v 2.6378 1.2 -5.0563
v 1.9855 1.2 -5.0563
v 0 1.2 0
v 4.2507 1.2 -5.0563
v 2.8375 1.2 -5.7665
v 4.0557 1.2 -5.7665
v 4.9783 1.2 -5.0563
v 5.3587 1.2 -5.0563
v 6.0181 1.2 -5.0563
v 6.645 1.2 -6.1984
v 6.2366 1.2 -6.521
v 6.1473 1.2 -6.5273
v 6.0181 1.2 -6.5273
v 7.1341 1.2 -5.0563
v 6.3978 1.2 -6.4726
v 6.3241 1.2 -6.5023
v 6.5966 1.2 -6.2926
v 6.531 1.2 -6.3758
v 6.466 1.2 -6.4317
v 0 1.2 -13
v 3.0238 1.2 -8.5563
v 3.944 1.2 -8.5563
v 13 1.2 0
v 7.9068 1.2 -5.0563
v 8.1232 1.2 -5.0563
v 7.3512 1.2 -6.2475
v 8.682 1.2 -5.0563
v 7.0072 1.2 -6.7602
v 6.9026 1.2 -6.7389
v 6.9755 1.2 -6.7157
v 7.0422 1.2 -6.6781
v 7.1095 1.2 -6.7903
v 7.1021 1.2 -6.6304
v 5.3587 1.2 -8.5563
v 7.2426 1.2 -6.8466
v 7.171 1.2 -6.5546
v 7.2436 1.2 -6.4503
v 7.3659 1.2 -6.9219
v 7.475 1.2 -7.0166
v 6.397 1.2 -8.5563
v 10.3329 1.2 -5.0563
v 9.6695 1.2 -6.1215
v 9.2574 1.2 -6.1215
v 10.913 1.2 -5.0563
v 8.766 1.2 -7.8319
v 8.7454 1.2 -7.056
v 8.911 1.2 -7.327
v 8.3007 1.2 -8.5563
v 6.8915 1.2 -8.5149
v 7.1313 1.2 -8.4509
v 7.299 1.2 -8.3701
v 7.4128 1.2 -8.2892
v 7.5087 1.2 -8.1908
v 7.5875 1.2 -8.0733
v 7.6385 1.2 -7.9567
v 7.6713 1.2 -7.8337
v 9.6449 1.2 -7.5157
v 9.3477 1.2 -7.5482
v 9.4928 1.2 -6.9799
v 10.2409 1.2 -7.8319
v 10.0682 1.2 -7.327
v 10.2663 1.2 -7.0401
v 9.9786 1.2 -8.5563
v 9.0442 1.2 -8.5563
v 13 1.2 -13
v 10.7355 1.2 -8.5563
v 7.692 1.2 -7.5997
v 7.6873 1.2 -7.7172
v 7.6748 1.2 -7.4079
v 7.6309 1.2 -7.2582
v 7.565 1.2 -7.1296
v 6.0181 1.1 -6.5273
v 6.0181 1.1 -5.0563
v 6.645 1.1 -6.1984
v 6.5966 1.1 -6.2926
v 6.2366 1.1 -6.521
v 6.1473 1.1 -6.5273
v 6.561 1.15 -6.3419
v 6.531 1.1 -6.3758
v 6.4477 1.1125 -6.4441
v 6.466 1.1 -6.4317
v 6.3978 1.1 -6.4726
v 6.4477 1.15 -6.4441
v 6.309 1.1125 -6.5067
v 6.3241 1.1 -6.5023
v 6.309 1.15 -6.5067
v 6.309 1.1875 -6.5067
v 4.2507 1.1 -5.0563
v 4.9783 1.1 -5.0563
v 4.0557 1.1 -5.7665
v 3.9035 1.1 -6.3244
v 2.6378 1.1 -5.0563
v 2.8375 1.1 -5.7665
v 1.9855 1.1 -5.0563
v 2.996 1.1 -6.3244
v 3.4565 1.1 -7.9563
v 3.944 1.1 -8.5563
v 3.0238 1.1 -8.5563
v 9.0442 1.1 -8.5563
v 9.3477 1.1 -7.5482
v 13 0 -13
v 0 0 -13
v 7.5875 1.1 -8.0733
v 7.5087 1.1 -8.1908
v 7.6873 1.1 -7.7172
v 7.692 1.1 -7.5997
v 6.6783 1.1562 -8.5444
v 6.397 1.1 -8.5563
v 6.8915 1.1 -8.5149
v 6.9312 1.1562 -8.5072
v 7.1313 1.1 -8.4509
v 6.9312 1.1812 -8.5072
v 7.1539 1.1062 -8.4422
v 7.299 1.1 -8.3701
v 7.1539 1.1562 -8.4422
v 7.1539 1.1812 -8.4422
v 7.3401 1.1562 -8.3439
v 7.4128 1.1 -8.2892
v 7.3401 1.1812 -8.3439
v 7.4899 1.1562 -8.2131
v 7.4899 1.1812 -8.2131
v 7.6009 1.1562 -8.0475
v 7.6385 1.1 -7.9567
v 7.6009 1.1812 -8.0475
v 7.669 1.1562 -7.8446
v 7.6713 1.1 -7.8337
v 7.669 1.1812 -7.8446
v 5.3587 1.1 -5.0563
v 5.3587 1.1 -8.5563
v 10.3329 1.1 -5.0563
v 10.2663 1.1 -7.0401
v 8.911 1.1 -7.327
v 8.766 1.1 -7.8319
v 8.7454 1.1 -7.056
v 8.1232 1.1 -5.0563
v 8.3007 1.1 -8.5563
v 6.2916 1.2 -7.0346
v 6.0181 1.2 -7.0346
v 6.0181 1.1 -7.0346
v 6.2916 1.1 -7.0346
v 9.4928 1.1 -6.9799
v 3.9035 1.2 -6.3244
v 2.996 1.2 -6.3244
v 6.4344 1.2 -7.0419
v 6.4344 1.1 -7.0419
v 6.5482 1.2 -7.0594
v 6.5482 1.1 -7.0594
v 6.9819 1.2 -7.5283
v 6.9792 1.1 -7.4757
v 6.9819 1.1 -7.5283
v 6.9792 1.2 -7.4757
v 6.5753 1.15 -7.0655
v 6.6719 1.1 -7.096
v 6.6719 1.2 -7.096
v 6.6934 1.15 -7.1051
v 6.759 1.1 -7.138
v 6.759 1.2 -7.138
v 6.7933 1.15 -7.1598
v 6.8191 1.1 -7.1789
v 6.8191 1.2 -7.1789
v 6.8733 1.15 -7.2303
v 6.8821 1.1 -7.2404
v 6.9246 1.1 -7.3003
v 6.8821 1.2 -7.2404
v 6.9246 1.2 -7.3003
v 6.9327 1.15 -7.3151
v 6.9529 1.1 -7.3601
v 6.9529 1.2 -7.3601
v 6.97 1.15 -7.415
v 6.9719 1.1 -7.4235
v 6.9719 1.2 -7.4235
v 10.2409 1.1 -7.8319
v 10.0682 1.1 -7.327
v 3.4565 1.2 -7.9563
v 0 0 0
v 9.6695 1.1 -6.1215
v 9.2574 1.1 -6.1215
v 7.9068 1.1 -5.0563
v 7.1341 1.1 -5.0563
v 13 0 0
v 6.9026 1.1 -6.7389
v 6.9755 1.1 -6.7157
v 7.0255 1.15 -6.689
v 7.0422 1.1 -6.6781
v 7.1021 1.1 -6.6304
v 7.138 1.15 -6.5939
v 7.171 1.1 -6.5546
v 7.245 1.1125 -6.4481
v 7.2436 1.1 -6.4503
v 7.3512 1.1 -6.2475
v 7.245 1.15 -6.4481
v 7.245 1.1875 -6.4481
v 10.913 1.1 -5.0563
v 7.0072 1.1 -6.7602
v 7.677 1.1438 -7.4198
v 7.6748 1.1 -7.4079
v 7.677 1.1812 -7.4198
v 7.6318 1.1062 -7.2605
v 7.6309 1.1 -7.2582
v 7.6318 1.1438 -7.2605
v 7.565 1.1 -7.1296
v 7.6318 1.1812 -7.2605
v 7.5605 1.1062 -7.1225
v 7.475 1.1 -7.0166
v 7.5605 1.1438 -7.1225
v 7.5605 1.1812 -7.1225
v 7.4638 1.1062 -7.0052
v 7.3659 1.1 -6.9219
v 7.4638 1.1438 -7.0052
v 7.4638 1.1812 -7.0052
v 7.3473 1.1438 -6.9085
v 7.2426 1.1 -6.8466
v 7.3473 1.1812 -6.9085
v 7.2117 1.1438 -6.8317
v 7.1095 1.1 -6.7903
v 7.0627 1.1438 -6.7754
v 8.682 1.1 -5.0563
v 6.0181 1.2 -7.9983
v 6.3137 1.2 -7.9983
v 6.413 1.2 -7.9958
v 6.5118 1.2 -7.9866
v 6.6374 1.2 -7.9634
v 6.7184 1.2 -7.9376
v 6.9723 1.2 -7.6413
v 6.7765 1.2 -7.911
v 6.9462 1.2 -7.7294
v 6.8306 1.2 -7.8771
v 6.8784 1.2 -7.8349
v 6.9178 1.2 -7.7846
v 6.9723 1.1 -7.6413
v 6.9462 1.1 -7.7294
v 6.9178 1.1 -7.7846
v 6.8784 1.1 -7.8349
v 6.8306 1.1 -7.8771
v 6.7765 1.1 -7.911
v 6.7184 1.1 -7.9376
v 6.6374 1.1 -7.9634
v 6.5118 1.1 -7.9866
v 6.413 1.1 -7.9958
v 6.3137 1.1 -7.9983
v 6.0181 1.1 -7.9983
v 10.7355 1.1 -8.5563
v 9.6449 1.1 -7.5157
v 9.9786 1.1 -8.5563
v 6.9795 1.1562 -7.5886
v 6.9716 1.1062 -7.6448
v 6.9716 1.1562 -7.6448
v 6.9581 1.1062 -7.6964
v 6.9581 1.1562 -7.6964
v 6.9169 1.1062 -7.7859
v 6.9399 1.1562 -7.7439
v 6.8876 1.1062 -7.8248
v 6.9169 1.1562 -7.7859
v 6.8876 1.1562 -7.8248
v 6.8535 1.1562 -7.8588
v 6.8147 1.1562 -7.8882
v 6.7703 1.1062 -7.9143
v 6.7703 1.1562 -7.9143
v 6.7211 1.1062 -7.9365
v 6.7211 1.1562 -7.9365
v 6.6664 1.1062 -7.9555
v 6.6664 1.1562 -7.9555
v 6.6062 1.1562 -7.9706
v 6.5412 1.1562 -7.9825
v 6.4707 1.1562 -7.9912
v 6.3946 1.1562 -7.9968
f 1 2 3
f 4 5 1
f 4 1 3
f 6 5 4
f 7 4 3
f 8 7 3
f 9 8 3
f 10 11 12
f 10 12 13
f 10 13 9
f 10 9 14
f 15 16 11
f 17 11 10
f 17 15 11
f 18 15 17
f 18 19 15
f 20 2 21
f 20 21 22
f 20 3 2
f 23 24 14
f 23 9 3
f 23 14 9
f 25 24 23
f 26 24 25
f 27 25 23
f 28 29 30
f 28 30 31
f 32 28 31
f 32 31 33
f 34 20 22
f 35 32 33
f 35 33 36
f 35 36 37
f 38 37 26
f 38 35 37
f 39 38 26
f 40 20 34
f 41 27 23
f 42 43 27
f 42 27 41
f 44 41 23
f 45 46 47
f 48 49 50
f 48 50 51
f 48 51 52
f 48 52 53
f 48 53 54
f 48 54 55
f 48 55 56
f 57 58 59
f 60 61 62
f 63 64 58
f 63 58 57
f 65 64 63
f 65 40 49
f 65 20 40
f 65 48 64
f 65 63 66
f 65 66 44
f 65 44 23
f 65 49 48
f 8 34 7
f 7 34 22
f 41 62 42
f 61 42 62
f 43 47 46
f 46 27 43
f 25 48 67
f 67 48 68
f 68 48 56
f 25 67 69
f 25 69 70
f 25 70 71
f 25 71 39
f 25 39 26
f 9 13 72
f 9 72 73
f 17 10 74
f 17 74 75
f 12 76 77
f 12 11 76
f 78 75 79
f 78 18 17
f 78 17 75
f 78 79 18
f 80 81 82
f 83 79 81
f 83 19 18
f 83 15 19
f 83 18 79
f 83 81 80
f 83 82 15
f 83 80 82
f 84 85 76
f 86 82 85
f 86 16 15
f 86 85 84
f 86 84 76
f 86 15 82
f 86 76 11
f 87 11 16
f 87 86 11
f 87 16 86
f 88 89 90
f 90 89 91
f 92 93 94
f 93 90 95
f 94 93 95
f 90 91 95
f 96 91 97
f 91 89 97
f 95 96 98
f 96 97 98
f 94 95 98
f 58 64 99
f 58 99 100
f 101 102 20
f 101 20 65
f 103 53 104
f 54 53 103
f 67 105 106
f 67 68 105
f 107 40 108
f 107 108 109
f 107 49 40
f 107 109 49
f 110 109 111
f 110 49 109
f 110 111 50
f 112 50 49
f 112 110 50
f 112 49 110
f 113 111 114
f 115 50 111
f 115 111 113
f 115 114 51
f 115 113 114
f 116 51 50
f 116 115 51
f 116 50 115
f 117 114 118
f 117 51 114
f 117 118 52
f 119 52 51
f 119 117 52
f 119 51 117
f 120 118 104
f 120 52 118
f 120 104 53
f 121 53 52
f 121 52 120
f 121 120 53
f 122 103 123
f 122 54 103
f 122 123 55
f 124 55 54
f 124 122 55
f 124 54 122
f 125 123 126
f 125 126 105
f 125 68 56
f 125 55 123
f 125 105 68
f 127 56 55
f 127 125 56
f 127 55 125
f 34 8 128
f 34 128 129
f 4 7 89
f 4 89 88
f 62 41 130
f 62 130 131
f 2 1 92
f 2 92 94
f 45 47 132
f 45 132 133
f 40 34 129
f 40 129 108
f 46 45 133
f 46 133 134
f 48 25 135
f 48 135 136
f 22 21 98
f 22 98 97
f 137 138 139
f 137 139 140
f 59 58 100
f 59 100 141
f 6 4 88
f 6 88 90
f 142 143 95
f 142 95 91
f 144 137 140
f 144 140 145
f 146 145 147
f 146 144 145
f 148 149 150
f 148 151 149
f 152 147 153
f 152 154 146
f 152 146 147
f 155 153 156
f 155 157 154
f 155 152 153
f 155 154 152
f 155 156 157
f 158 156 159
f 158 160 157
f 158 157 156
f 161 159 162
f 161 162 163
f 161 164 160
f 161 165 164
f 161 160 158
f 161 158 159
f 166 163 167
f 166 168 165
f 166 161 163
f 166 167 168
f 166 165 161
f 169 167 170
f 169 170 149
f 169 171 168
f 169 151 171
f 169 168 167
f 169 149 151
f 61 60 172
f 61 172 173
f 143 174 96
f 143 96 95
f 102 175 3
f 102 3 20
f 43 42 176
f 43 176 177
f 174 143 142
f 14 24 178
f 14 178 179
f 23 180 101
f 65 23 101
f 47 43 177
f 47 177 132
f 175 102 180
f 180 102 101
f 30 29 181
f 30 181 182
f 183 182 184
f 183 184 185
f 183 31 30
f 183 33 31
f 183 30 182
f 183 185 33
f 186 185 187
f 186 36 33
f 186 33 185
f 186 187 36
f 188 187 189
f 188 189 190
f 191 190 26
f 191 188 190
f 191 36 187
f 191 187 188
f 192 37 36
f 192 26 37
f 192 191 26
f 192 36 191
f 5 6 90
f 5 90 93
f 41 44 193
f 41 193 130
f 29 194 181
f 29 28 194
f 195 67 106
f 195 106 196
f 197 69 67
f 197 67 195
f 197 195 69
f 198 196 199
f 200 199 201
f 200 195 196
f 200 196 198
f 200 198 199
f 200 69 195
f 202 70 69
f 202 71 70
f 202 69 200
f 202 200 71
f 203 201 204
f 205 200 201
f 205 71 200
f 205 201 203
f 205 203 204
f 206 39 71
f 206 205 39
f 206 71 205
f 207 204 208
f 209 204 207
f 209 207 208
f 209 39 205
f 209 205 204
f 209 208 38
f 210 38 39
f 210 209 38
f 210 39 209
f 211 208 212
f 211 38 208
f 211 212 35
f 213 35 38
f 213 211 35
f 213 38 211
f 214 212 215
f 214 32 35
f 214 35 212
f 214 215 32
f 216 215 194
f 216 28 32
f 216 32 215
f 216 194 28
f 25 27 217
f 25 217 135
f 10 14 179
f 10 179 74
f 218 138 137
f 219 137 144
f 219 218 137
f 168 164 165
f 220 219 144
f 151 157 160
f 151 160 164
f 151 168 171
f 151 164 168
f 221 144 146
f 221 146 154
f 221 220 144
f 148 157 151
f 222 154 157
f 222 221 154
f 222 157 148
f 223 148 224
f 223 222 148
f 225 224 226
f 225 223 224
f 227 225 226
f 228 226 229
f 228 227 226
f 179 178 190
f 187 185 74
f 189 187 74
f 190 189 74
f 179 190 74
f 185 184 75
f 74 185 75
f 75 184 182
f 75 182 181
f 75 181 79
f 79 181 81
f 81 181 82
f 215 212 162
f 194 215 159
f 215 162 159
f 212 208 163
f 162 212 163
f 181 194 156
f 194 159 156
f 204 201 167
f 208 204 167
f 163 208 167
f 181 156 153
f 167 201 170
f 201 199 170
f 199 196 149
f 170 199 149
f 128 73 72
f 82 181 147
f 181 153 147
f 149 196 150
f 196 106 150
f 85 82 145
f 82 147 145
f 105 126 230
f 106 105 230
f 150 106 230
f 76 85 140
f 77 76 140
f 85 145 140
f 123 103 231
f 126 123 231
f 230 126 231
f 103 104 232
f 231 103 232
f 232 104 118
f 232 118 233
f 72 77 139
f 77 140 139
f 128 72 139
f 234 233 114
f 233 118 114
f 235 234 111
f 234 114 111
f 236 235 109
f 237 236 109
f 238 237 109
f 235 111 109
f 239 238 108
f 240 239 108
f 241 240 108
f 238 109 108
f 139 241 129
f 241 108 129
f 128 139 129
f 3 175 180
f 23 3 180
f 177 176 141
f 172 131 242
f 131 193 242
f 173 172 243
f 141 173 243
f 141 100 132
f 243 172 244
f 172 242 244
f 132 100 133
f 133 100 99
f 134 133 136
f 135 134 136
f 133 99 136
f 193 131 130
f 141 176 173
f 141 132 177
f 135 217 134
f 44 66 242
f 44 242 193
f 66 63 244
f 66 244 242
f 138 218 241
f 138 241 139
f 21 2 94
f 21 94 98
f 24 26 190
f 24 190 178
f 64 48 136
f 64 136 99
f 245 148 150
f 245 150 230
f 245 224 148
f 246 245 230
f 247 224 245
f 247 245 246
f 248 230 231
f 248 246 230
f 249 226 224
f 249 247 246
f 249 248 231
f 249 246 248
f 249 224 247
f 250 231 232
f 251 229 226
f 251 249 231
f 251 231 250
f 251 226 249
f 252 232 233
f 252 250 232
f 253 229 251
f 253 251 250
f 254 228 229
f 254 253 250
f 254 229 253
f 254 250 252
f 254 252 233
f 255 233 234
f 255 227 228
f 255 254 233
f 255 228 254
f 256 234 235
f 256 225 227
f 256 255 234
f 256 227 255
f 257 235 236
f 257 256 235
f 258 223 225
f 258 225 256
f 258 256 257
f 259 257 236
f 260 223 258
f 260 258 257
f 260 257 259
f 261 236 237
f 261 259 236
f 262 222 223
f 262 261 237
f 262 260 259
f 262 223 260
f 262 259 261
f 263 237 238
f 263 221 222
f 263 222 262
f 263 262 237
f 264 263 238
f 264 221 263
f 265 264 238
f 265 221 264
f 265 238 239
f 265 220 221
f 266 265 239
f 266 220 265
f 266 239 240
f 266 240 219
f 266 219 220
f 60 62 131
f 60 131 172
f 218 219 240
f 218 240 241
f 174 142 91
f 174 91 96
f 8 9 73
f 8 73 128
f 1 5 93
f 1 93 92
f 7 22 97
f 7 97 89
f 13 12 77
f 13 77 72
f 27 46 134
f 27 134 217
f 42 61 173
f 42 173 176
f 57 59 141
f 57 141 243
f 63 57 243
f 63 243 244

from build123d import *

# Parameters (mm, degrees)
SKETCH_1_W          = 13
SKETCH_1_H          = 13
EXTRUDE_1_DEPTH     = 1.2
CUT_EXTRUDE_1_DEPTH = 0.1


with BuildPart() as part:
    # 스케치1 → 보스-돌출1 (new body)
    with BuildSketch(Plane(origin=(0, 0, 0), x_dir=(1, 0, 0), z_dir=(0, 1, 0))):
        with Locations((6.5, 6.5)):
            Rectangle(SKETCH_1_W, SKETCH_1_H)
    extrude(amount=EXTRUDE_1_DEPTH)

    # 스케치2 → 컷-돌출1 (cut)
    # profile 1 of 3: a face of its own
    with BuildSketch(Plane(origin=(0, 1.2, 0), x_dir=(1, 0, 0), z_dir=(0, 1, 0))):
        Polygon((4.250679348, 5.056307), (4.055706522, 5.766451927), (2.837522645, 5.766451927), (2.637794384, 5.056307), (1.985507246, 5.056307), (3.023777174, 8.556307), (3.943953804, 8.556307), (4.97826087, 5.056307), align=None)
        Polygon((3.456521739, 7.956329645), (2.996037138, 6.324422942), (3.903532609, 6.324422942), align=None, mode=Mode.SUBTRACT)
    # profile 2 of 3: a face of its own
    with BuildSketch(Plane(origin=(0, 1.2, 0), x_dir=(1, 0, 0), z_dir=(0, 1, 0))):
        with BuildLine():
            Line((7.134057971, 5.056307), (6.645040761, 6.19840392))
            add(Edge.make_bspline(
                [(6.645040761, 6.19840392), (6.633140099, 6.224457557), (6.610014837, 6.275084758), (6.563209444, 6.342128185), (6.509811234, 6.399411177), (6.448644022, 6.445682133), (6.381682405, 6.482444974), (6.308539756, 6.509067271), (6.229531944, 6.523845527), (6.175103907, 6.526146361), (6.147305254, 6.527321493)],
                knots=[0, 0, 0, 0, 1.07937985, 2.097441539, 3.071055259, 4.024539089, 4.97969058, 5.945096662, 6.95047571, 8, 8, 8, 8], degree=3))
            Line((6.147305254, 6.527321493), (6.018115942, 6.527321493))
            Line((6.018115942, 6.527321493), (6.018115942, 5.056307))
            Line((6.018115942, 5.056307), (5.358695652, 5.056307))
            Line((5.358695652, 5.056307), (5.358695652, 8.556307))
            Line((5.358695652, 8.556307), (6.39696558, 8.556307))
            add(Edge.make_bspline(
                [(6.39696558, 8.556307), (6.44505717, 8.555625641), (6.538943451, 8.554295466), (6.676327112, 8.546059268), (6.806380562, 8.529765303), (6.929644175, 8.508976612), (7.045344555, 8.480766902), (7.152892252, 8.444777918), (7.251035462, 8.399228962), (7.340359594, 8.345941352), (7.421212147, 8.285103341), (7.491613585, 8.214455993), (7.552224164, 8.135276977), (7.603648187, 8.047491351), (7.643248856, 7.949743303), (7.671665885, 7.842199248), (7.689364198, 7.72442637), (7.691119029, 7.642272434), (7.692028986, 7.599672036)],
                knots=[0, 0, 0, 0, 1.254438722, 2.448964256, 3.587437174, 4.671603447, 5.707801299, 6.690588177, 7.624750448, 8.524079809, 9.399245701, 10.256818247, 11.116851234, 11.993805779, 12.902354155, 13.858471343, 14.889524007, 16, 16, 16, 16], degree=3))
            add(Edge.make_bspline(
                [(7.692028986, 7.599672036), (7.691239008, 7.568729477), (7.689701007, 7.508487697), (7.67857865, 7.420582401), (7.659612629, 7.33803397), (7.633373986, 7.26083316), (7.600627828, 7.188931064), (7.561886691, 7.122064044), (7.516214192, 7.06058734), (7.464777001, 7.004463206), (7.408086514, 6.95379773), (7.347469348, 6.907176769), (7.281836186, 6.866190289), (7.211821483, 6.830802554), (7.13891719, 6.799526164), (7.062639527, 6.774610517), (6.983843926, 6.753518878), (6.929921739, 6.743838474), (6.902626812, 6.73893834)],
                knots=[0, 0, 0, 0, 1.155349972, 2.249340124, 3.302347646, 4.313193118, 5.288908417, 6.248327119, 7.193487508, 8.143168254, 9.086215168, 10.029416886, 10.995709606, 11.970826185, 12.956664107, 13.955010984, 14.964844911, 16, 16, 16, 16], degree=3))
            add(Edge.make_bspline(
                [(6.902626812, 6.73893834), (6.923791025, 6.733389456), (6.966851888, 6.722099656), (7.027441412, 6.689635303), (7.085715125, 6.647405354), (7.141142197, 6.592932019), (7.194441134, 6.525586953), (7.248087068, 6.445630446), (7.301022677, 6.351561616), (7.333914569, 6.283407325), (7.351222826, 6.247543413)],
                knots=[0, 0, 0, 0, 0.75991202, 1.546122521, 2.376404305, 3.261596413, 4.243343524, 5.3639781, 6.612881775, 8, 8, 8, 8], degree=3))
            Line((7.351222826, 6.247543413), (7.906816123, 5.056307))
            Line((7.906816123, 5.056307), (7.134057971, 5.056307))
        make_face()
        with BuildLine():
            add(Edge.make_bspline(
                [(6.981884058, 7.528340514), (6.981504962, 7.548443488), (6.980768494, 7.587497473), (6.97288702, 7.643906223), (6.959177112, 7.695888053), (6.941354104, 7.743464314), (6.917779005, 7.786814444), (6.888480303, 7.825348904), (6.85415561, 7.859861657), (6.814341891, 7.8894352), (6.770019497, 7.915597864), (6.720166621, 7.937703476), (6.665384141, 7.956898026), (6.605021149, 7.971449032), (6.539670856, 7.983441688), (6.468997822, 7.991891457), (6.393100108, 7.99771625), (6.340704806, 7.998125441), (6.313745471, 7.998335985)],
                knots=[0, 0, 0, 0, 1.03221539, 2.00528173, 2.91708139, 3.789130794, 4.609038712, 5.442315575, 6.267597059, 7.100873922, 7.98300273, 8.906244241, 9.897686097, 10.9608414, 12.092146654, 13.309174969, 14.615470257, 16, 16, 16, 16], degree=3))
            Line((6.313745471, 7.998335985), (6.018115942, 7.998335985))
            Line((6.018115942, 7.998335985), (6.018115942, 7.034567869))
            Line((6.018115942, 7.034567869), (6.291553442, 7.034567869))
            add(Edge.make_bspline(
                [(6.291553442, 7.034567869), (6.341322659, 7.035985514), (6.436681628, 7.038701754), (6.552097974, 7.058540895), (6.636338433, 7.08131439), (6.692892375, 7.104289198), (6.74553881, 7.129163549), (6.793316435, 7.158720954), (6.836485578, 7.191818863), (6.873724603, 7.229589267), (6.906802207, 7.270052793), (6.933921834, 7.314901578), (6.95514363, 7.363467605), (6.97148897, 7.415152604), (6.979928216, 7.47073524), (6.981219446, 7.508765729), (6.981884058, 7.528340514)],
                knots=[0, 0, 0, 0, 2.184691281, 4.185918933, 5.126368008, 6.012027286, 6.863184627, 7.681184451, 8.47504028, 9.246354907, 10.005704987, 10.765941227, 11.540044168, 12.329221459, 13.140028664, 14, 14, 14, 14], degree=3))
        make_face(mode=Mode.SUBTRACT)
    # profile 3 of 3: a face of its own
    with BuildSketch(Plane(origin=(0, 1.2, 0), x_dir=(1, 0, 0), z_dir=(0, 1, 0))):
        Polygon((10.332880435, 5.056307), (10.266304348, 7.040115877), (10.240942029, 7.831895768), (10.068161232, 7.327027109), (9.669497283, 6.121524391), (9.257359601, 6.121524391), (8.911005435, 7.327027109), (8.765964674, 7.831895768), (8.74535779, 7.055967326), (8.681951993, 5.056307), (8.123188406, 5.056307), (8.300724638, 8.556307), (9.044157609, 8.556307), (9.347712862, 7.548154826), (9.492753623, 6.979880369), (9.644927536, 7.515659355), (9.978600543, 8.556307), (10.735507246, 8.556307), (10.913043478, 5.056307), align=None)
    extrude(amount=-CUT_EXTRUDE_1_DEPTH, mode=Mode.SUBTRACT)


solid = part.part
